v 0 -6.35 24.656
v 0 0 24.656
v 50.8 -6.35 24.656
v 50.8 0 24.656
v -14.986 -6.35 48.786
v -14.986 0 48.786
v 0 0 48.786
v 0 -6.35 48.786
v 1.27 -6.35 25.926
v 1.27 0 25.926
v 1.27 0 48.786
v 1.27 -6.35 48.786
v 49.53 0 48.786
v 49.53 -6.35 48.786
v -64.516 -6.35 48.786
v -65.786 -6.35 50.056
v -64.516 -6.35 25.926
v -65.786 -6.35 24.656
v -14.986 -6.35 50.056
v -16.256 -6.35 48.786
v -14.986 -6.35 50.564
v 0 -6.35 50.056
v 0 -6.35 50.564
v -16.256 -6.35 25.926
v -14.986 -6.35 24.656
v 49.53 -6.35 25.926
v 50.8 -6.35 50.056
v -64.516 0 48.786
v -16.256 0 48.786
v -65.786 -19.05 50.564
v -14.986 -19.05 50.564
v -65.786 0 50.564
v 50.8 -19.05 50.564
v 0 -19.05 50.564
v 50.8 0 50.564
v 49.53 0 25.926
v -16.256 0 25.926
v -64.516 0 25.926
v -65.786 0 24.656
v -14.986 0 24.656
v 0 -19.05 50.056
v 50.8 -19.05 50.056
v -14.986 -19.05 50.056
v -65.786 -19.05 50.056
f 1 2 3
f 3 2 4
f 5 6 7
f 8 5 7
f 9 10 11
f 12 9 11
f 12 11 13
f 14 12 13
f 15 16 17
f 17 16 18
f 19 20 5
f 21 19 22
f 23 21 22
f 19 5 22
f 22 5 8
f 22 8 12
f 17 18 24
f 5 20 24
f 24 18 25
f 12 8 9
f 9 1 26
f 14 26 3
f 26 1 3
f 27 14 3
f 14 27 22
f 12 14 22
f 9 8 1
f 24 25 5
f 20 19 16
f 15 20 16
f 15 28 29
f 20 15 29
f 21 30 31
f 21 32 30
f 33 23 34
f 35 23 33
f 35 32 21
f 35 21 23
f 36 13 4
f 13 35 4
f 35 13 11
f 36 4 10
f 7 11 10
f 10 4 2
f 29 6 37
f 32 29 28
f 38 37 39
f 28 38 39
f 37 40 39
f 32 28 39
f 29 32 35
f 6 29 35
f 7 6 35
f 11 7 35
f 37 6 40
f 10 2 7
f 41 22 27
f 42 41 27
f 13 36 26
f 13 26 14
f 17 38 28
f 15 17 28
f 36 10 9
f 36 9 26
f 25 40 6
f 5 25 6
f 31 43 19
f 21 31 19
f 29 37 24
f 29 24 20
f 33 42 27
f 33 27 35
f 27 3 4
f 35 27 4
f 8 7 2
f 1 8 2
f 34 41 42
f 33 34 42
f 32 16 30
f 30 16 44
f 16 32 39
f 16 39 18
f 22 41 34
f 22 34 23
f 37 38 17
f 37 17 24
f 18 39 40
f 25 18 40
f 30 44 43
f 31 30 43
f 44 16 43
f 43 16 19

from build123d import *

# Parameters (mm, degrees)
F0_W     = 14.986
F0_H     = 1.27
F1_DEPTH = 1.27
F0_W_2   = 48.26
F0_H_2   = 22.86
F2_DEPTH = 6.35
F3_W     = 50.8
F3_H     = 12.7
F4_DEPTH = 0.508


# Not quite as in the source:
# - a feature names something its author has since deleted; it is built from what else it names


with BuildPart() as f1:
    # F0 (on Front) → F1 (new body)
    with BuildSketch(Plane.XZ):
        with Locations((-7.493, 49.4207651077)):
            Rectangle(F0_W, F0_H)
    extrude(amount=F1_DEPTH)

    # F0 (on Front) → F2 (join)
    with BuildSketch(Plane.XZ):
        Polygon((-14.986, 50.0557651077), (-65.786, 50.0557651077), (-65.786, 24.6557651077), (-14.986, 24.6557651077), (-14.986, 34.8157651077), (-14.986, 48.7857651077), align=None)
        with Locations((-40.386, 37.3557651077)):
            Rectangle(F0_W_2, F0_H_2, mode=Mode.SUBTRACT)
        with Locations((-7.493, 49.4207651077)):
            Rectangle(F0_W, F0_H)
        Polygon((50.8, 50.0557651077), (0, 50.0557651077), (0, 48.7857651077), (0, 34.8157651077), (0, 24.6557651077), (50.8, 24.6557651077), align=None)
        with Locations((25.4, 37.3557651077)):
            Rectangle(F0_W_2, F0_H_2, mode=Mode.SUBTRACT)
    extrude(amount=F2_DEPTH)

    # F3 (on face) → F4 (join)
    with BuildSketch(Plane.XY.offset(50.0557651077)):
        with Locations((-40.386, -12.7)):
            Rectangle(F3_W, F3_H)
        with Locations((25.4, -12.7)):
            Rectangle(F3_W, F3_H)
        Polygon((-65.786, 0), (-65.786, -6.35), (-14.986, -6.35), (0, -6.35), (50.8, -6.35), (50.8, 0), align=None)
    extrude(amount=F4_DEPTH)


solid = f1.part
